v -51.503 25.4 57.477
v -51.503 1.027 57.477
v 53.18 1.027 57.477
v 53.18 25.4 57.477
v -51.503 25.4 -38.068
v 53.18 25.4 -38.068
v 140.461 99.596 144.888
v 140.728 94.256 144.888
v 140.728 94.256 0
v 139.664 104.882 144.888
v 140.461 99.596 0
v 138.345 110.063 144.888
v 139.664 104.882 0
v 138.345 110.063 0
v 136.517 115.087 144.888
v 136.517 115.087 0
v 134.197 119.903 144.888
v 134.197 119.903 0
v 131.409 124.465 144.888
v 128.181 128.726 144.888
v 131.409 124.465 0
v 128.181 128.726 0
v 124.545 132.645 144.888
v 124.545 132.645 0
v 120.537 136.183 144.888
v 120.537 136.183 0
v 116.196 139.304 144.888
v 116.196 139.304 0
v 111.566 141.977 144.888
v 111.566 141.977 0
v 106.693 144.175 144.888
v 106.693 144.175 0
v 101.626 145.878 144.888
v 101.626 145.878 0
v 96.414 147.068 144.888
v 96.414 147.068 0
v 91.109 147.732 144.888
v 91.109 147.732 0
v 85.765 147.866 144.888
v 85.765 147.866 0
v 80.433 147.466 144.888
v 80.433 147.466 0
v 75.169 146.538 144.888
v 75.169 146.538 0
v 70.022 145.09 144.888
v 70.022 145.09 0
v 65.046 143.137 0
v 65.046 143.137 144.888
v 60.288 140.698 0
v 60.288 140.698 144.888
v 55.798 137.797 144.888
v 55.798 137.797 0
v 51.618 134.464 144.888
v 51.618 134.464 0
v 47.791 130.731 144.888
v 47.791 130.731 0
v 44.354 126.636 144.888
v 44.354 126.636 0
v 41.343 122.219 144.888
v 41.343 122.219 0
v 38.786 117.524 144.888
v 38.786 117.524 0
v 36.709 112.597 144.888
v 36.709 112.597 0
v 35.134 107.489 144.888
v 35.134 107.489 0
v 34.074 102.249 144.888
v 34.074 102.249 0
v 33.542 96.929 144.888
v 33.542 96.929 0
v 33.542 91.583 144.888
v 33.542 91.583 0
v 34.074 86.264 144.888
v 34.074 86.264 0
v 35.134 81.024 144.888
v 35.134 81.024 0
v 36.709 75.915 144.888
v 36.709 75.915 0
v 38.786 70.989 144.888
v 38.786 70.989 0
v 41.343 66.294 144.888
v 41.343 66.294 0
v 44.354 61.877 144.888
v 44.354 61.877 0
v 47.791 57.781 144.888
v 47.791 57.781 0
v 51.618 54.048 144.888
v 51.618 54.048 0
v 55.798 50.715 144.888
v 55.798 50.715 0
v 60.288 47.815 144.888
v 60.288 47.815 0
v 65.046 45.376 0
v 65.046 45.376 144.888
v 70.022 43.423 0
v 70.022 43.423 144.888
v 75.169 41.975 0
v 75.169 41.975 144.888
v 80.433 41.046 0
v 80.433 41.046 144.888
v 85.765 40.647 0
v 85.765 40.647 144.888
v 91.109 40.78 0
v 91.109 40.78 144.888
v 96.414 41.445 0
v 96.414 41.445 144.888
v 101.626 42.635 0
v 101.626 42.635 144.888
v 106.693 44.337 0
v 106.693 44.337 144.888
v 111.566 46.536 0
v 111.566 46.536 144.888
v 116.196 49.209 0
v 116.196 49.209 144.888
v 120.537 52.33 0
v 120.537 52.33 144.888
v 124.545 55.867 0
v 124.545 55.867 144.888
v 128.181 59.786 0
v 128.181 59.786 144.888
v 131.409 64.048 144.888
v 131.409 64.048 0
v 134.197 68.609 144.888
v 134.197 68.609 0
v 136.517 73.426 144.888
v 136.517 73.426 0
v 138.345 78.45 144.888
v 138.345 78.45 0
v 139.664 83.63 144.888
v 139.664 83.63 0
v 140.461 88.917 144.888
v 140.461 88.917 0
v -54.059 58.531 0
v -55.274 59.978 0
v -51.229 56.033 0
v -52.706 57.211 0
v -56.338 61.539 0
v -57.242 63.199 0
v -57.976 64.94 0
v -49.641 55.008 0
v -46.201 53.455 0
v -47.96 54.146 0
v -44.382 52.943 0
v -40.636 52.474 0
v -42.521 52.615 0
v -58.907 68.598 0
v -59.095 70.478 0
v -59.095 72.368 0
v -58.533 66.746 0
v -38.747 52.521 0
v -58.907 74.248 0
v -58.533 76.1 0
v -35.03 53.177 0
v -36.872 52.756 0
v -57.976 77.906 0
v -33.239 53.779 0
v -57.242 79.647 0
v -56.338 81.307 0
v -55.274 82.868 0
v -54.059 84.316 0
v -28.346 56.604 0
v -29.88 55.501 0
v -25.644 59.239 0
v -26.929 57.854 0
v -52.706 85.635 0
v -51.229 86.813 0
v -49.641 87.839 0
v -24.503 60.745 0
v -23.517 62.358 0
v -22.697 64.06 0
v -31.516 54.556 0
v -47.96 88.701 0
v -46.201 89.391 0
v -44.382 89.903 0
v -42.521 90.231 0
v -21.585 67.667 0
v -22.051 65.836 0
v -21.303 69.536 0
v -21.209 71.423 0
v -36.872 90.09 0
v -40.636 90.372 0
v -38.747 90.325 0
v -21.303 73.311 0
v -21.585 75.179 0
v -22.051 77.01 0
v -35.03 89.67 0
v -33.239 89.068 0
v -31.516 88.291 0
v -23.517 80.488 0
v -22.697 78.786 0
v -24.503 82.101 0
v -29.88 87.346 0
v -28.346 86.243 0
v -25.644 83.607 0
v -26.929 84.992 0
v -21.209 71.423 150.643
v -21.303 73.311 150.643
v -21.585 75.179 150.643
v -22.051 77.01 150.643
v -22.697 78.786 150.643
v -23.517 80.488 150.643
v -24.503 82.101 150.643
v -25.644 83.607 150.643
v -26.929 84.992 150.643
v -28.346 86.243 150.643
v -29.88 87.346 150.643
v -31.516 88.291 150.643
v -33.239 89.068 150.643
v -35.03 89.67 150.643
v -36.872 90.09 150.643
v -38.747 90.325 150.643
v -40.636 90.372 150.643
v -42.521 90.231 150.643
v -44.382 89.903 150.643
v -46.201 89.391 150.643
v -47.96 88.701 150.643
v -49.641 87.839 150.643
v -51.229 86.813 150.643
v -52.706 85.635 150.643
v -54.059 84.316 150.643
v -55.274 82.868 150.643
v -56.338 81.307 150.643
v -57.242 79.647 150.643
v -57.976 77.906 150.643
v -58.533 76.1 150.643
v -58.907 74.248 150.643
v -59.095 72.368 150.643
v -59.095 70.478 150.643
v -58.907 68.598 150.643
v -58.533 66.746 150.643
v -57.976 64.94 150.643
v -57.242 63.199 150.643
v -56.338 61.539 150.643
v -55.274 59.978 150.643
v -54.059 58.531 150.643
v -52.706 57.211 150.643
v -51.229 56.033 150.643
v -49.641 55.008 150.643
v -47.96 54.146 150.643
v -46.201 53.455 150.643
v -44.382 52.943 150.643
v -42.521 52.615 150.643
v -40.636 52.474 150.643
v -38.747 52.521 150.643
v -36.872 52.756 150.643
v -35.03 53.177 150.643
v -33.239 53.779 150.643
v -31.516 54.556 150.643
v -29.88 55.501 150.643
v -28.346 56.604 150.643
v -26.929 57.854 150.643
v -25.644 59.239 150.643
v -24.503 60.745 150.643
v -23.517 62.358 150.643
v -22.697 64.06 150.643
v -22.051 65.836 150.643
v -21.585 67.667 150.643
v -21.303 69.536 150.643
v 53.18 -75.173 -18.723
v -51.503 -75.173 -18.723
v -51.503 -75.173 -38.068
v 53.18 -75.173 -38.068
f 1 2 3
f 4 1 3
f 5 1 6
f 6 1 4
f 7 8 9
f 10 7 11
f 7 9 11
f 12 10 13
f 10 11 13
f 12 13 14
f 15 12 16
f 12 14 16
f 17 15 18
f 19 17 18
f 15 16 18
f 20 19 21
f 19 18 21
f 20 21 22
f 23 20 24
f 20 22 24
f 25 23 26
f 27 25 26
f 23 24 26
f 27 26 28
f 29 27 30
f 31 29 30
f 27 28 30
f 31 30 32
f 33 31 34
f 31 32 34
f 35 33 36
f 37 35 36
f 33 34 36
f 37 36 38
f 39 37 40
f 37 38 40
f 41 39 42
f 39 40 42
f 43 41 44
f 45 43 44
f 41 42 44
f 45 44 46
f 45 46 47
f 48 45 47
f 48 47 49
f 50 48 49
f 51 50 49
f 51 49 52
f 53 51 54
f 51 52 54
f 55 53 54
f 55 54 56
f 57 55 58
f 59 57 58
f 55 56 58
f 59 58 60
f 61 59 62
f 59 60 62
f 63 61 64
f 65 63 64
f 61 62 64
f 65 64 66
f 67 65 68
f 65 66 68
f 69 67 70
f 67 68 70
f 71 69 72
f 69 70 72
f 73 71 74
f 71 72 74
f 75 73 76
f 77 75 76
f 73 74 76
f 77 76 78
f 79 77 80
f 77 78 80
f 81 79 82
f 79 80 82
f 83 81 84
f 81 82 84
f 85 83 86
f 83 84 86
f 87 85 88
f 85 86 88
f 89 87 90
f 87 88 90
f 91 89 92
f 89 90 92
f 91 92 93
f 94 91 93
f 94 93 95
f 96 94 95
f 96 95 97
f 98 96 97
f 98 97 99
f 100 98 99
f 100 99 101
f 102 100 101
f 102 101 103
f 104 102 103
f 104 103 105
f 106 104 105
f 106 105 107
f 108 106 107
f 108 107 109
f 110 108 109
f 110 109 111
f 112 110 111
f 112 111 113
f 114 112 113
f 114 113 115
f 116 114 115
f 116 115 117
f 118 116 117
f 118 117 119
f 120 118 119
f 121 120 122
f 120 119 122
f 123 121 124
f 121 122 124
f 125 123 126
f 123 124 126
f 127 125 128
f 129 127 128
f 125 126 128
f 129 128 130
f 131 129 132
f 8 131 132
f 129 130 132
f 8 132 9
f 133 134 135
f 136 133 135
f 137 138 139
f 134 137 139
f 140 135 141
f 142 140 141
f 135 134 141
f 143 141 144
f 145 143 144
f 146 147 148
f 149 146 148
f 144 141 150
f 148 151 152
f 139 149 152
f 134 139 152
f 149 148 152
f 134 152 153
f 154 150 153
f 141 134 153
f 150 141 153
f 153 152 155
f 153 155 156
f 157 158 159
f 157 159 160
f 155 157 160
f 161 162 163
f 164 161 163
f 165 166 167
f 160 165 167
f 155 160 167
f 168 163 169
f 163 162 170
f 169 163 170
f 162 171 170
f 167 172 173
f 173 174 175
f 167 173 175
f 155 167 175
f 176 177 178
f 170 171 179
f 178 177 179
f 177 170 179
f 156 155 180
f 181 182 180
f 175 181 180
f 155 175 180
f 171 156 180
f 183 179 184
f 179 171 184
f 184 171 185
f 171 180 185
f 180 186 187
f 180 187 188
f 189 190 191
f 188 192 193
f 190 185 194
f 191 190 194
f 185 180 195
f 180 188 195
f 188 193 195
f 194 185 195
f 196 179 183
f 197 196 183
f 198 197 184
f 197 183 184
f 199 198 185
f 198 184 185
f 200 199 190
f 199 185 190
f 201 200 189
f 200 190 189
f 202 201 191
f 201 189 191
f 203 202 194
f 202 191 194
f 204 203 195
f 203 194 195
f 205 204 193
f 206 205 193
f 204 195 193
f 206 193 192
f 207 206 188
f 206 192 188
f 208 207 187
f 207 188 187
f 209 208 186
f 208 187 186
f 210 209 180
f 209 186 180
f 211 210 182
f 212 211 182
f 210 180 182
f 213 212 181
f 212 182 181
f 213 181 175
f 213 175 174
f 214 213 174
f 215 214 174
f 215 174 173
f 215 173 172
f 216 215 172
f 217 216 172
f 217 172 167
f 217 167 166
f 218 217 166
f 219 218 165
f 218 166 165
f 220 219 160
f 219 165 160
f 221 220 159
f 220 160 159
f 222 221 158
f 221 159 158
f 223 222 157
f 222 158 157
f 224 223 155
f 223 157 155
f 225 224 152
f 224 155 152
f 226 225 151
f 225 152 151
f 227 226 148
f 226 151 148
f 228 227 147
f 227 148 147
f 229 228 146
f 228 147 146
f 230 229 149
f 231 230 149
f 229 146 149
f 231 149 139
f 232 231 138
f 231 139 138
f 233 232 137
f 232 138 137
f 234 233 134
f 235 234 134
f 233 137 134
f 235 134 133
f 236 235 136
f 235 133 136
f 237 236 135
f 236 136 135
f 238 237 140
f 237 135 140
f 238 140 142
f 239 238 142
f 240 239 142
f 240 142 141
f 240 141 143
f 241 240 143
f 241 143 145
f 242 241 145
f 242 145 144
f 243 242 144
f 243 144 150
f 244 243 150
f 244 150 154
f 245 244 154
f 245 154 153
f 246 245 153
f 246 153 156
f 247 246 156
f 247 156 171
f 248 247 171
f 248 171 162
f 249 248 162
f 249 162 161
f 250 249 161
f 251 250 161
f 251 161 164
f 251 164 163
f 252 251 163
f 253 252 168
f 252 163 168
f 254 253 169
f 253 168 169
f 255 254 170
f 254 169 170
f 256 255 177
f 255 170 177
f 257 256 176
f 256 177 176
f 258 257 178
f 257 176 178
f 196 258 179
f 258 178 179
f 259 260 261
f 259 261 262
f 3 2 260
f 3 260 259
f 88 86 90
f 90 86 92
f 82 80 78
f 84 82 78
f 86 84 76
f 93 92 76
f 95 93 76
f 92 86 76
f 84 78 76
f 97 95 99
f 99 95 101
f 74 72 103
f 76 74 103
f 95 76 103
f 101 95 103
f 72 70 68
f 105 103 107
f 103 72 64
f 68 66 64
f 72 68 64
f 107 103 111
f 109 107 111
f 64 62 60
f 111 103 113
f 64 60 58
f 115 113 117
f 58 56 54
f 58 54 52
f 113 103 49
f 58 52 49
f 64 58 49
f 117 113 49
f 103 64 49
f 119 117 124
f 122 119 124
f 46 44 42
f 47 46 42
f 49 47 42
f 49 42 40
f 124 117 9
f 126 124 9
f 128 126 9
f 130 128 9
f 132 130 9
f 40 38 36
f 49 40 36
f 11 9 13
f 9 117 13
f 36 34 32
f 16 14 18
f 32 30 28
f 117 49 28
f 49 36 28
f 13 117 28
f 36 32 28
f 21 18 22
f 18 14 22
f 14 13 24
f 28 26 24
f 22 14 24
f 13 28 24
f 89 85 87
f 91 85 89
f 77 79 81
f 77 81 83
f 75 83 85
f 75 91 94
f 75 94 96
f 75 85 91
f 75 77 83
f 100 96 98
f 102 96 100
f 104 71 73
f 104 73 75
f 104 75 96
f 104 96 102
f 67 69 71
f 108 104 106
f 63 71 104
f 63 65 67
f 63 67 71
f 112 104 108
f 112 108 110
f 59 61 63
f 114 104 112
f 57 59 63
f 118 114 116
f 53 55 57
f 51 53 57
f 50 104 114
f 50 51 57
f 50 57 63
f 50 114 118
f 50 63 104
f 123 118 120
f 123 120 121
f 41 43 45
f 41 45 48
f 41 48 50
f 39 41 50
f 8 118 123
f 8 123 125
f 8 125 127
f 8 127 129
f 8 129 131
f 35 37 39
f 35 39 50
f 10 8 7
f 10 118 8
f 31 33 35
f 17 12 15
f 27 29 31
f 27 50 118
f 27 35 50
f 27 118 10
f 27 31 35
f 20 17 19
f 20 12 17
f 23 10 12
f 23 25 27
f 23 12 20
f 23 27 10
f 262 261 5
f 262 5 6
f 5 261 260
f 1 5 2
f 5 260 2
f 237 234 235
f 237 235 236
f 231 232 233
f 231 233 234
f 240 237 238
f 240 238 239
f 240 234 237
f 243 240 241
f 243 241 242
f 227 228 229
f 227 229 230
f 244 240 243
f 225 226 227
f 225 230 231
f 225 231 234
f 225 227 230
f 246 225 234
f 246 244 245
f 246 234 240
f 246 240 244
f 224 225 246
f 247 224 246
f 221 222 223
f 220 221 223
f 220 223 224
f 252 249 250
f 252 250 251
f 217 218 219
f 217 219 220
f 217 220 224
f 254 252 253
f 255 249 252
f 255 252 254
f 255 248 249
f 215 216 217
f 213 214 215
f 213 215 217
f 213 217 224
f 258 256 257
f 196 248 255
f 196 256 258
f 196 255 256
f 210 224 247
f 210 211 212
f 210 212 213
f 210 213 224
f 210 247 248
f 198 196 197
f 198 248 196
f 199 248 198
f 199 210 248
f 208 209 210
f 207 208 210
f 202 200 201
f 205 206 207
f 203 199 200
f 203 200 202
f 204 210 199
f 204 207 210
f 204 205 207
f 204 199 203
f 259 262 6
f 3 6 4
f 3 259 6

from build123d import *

# Parameters (mm, degrees)
F0_W          = 104.683742
F0_H          = 95.544599
F1_DEPTH      = 75.173438
F1_DEPTH_BACK = 25.4
F2_SIZE       = 76.2
F3_R          = 18.95495
F4_DEPTH      = 150.642723
F5_R          = 53.626068
F6_DEPTH      = 144.887626


with BuildPart() as f1:
    # F0 (on Front) → F1 (new body, two sides)
    with BuildSketch(Plane.XZ) as f1_sk:
        with Locations((0.838421, 9.704289)):
            Rectangle(F0_W, F0_H)
    extrude(amount=F1_DEPTH)
    extrude(f1_sk.sketch, amount=-F1_DEPTH_BACK)

    # F2
    f2_edges = [f1.edges().sort_by_distance(p)[0] for p in [
        (0.838421, -75.173438, 57.476588),
    ]]
    chamfer(f2_edges, length=F2_SIZE)


with BuildPart() as f4:
    # F3 (on Top) → F4 (new body)
    with BuildSketch(Plane.XY):
        with Locations((-40.163904, 71.423203)):
            Circle(F3_R)
    extrude(amount=F4_DEPTH)


with BuildPart() as f6:
    # F5 (on Top) → F6 (new body)
    with BuildSketch(Plane.XY):
        with Locations((87.101445, 94.256274)):
            Circle(F5_R)
    extrude(amount=F6_DEPTH)


solid = Compound([f1.part, f4.part, f6.part])
